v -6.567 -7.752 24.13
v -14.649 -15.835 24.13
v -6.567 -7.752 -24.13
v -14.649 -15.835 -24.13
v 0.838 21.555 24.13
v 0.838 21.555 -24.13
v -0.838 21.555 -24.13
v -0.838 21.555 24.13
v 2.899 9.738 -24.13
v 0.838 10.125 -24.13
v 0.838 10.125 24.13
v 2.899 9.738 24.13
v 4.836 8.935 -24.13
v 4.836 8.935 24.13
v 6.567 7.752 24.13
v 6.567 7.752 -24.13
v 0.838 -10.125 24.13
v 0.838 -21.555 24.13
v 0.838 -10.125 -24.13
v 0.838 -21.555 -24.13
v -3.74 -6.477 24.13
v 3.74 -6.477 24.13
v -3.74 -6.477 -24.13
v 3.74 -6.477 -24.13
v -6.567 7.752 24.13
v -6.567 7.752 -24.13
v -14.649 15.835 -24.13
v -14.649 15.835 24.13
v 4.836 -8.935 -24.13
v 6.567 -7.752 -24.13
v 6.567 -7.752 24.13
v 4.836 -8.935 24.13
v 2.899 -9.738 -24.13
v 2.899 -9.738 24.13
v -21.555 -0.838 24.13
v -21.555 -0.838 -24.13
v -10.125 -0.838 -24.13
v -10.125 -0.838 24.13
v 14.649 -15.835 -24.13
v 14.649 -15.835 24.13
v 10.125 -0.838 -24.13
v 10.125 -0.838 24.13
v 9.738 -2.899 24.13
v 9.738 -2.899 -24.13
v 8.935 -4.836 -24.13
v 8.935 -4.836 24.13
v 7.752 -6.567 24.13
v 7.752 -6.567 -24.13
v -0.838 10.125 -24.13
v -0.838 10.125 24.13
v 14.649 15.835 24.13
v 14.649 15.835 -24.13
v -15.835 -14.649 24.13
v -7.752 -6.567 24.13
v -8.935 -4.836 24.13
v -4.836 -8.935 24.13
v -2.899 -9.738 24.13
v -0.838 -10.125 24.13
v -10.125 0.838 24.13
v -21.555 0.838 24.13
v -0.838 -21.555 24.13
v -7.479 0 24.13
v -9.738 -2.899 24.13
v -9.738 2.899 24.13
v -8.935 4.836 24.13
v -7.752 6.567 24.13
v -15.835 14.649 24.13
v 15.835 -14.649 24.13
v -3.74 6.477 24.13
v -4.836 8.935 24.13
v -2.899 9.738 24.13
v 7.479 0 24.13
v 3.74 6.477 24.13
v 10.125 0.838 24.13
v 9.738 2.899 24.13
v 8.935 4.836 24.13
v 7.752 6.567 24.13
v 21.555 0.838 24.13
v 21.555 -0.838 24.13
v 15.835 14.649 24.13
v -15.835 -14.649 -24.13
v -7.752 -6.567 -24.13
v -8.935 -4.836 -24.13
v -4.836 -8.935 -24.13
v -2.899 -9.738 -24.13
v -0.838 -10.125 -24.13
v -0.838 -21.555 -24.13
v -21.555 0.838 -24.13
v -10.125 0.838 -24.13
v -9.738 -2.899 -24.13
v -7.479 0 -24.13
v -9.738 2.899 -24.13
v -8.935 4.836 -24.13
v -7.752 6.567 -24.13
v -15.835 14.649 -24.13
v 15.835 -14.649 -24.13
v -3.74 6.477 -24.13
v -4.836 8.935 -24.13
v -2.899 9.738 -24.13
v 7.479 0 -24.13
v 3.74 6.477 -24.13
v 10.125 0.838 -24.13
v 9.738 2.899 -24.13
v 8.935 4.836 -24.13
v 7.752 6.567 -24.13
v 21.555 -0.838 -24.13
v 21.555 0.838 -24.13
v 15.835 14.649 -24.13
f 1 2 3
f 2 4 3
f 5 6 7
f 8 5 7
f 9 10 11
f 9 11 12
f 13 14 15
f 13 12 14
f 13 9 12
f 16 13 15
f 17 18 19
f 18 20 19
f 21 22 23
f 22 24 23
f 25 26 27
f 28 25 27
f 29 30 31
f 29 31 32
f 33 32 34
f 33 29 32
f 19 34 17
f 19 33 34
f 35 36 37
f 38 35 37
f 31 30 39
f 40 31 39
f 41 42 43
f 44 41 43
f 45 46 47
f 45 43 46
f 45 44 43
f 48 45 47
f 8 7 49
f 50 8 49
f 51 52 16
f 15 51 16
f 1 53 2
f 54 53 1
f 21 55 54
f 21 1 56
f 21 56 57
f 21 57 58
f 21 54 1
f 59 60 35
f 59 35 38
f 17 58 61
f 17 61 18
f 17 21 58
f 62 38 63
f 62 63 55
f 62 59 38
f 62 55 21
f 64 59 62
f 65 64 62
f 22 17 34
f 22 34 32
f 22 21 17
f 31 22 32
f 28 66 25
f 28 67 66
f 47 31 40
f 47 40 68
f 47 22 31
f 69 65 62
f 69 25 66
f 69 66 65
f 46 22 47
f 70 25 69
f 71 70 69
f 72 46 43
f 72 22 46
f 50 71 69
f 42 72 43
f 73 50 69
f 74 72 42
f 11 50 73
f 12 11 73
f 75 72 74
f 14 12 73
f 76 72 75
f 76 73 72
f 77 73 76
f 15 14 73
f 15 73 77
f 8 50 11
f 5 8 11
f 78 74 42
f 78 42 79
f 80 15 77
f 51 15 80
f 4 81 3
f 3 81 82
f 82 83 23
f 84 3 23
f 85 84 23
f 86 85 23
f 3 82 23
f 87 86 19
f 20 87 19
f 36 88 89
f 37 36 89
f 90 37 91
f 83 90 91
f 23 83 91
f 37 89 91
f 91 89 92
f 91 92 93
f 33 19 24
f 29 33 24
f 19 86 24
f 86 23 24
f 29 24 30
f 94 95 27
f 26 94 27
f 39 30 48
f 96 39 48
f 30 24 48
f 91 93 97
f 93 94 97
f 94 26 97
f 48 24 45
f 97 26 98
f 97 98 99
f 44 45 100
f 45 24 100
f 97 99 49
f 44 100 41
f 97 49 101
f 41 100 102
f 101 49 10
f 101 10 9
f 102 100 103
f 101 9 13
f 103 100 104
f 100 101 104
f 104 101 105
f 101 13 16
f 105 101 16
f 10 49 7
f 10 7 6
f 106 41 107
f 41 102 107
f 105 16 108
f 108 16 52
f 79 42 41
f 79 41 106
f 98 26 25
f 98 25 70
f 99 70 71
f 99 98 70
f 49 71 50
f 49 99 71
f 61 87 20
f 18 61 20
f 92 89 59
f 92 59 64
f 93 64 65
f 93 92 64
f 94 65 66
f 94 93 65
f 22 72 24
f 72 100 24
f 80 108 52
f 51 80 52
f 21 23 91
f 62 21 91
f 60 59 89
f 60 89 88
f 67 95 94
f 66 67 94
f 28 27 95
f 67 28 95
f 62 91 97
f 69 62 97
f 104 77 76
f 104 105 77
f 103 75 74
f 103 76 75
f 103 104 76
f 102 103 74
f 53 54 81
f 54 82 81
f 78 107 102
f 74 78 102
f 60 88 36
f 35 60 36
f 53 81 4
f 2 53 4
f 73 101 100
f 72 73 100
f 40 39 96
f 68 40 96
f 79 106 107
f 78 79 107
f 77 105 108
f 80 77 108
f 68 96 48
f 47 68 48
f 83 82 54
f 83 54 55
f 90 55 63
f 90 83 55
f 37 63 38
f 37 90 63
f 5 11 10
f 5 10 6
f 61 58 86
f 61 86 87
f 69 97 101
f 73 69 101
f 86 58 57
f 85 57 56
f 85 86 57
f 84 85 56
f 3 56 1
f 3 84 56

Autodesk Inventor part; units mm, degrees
ref_plane "YZ Plane" through (0, 0, 0) normal (1, 0, 0) x (0, 1, 0)
ref_plane "XZ Plane" through (0, 0, 0) normal (0, 1, 0) x (-1, 0, 0)
ref_plane "XY Plane" through (0, 0, 0) normal (0, 0, 1) x (1, 0, 0)
sketch "Sketch1" plane through (0, 0, 0) normal (0, 0, 1) x (1, 0, 0)
  circle A0 centre (0, 0) radius 10.16
  circle A1 centre (0, 0) radius 8.5725
  line L0 (0.8382, 10.1254) -> (0.8382, 21.5554)
  line L1 (0.8382, 21.5554) -> (-0.8382, 21.5554)
  line L2 (-0.8382, 21.5554) -> (-0.8382, 10.1254)
  line L3 (-15.8346, 14.6492) -> (-7.7524, 6.567)
  line L4 (-14.6492, 15.8346) -> (-15.8346, 14.6492)
  line L5 (-6.567, 7.7524) -> (-14.6492, 15.8346)
  line L6 (-21.5554, -0.8382) -> (-10.1254, -0.8382)
  line L7 (-21.5554, 0.8382) -> (-21.5554, -0.8382)
  line L8 (-10.1254, 0.8382) -> (-21.5554, 0.8382)
  line L9 (-14.6492, -15.8346) -> (-6.567, -7.7524)
  line L10 (-15.8346, -14.6492) -> (-14.6492, -15.8346)
  line L11 (-7.7524, -6.567) -> (-15.8346, -14.6492)
  line L12 (0.8382, -21.5554) -> (0.8382, -10.1254)
  line L13 (-0.8382, -21.5554) -> (0.8382, -21.5554)
  line L14 (-0.8382, -10.1254) -> (-0.8382, -21.5554)
  line L15 (15.8346, -14.6492) -> (7.7524, -6.567)
  line L16 (14.6492, -15.8346) -> (15.8346, -14.6492)
  line L17 (6.567, -7.7524) -> (14.6492, -15.8346)
  line L18 (21.5554, 0.8382) -> (10.1254, 0.8382)
  line L19 (21.5554, -0.8382) -> (21.5554, 0.8382)
  line L20 (10.1254, -0.8382) -> (21.5554, -0.8382)
  line L21 (14.6492, 15.8346) -> (6.567, 7.7524)
  line L22 (15.8346, 14.6492) -> (14.6492, 15.8346)
  line L23 (7.7524, 6.567) -> (15.8346, 14.6492)
  line L24 (-7.479, 0) -> (-3.7395, 6.477)
  line L25 (-3.7395, 6.477) -> (3.7395, 6.477)
  line L26 (3.7395, 6.477) -> (7.479, 0)
  line L27 (7.479, 0) -> (3.7395, -6.477)
  line L28 (3.7395, -6.477) -> (-3.7395, -6.477)
  line L29 (-3.7395, -6.477) -> (-7.479, 0)
  point P0 (0, 21.5554)
  point P1 (-15.2419, 15.2419)
  point P2 (-21.5554, 0)
  point P3 (-15.2419, -15.2419)
  point P4 (0, -21.5554)
  point P5 (15.2419, -15.2419)
  point P6 (21.5554, 0)
  point P7 (15.2419, 15.2419)
  point P8 (-10.1254, -0.8382)
  point P9 (-10.1254, 0.8382)
  point P10 (-6.567, -7.7524)
  point P11 (-7.7524, -6.567)
  point P12 (0.8382, -10.1254)
  point P13 (-0.8382, -10.1254)
  point P14 (7.7524, -6.567)
  point P15 (6.567, -7.7524)
  point P16 (10.1254, 0.8382)
  point P17 (10.1254, -0.8382)
  point P18 (6.567, 7.7524)
  point P19 (7.7524, 6.567)
  point P20 (-7.7524, 6.567)
  point P21 (-6.567, 7.7524)
  dimension "d0" = 20.32
  dimension "d1" = 1.5875
  dimension "d7" = 1.6764
  dimension "d11" = 360
  dimension "d13" = 11.43
  dimension "d17" = 12.954
extrude "Extrusion1" add sketch "Sketch1" along normal mid plane 48.26 contours A0 | A0 L18 L19 L20 | A0 L21 L22 L23 | L15 L16 L17 A0 | A0 L2 L1 L0 | L12 L13 L14 A0 | A0 L3 L4 L5 | L9 L10 L11 A0 | A0 L6 L7 L8 | A1
properties part number "Spiral"
